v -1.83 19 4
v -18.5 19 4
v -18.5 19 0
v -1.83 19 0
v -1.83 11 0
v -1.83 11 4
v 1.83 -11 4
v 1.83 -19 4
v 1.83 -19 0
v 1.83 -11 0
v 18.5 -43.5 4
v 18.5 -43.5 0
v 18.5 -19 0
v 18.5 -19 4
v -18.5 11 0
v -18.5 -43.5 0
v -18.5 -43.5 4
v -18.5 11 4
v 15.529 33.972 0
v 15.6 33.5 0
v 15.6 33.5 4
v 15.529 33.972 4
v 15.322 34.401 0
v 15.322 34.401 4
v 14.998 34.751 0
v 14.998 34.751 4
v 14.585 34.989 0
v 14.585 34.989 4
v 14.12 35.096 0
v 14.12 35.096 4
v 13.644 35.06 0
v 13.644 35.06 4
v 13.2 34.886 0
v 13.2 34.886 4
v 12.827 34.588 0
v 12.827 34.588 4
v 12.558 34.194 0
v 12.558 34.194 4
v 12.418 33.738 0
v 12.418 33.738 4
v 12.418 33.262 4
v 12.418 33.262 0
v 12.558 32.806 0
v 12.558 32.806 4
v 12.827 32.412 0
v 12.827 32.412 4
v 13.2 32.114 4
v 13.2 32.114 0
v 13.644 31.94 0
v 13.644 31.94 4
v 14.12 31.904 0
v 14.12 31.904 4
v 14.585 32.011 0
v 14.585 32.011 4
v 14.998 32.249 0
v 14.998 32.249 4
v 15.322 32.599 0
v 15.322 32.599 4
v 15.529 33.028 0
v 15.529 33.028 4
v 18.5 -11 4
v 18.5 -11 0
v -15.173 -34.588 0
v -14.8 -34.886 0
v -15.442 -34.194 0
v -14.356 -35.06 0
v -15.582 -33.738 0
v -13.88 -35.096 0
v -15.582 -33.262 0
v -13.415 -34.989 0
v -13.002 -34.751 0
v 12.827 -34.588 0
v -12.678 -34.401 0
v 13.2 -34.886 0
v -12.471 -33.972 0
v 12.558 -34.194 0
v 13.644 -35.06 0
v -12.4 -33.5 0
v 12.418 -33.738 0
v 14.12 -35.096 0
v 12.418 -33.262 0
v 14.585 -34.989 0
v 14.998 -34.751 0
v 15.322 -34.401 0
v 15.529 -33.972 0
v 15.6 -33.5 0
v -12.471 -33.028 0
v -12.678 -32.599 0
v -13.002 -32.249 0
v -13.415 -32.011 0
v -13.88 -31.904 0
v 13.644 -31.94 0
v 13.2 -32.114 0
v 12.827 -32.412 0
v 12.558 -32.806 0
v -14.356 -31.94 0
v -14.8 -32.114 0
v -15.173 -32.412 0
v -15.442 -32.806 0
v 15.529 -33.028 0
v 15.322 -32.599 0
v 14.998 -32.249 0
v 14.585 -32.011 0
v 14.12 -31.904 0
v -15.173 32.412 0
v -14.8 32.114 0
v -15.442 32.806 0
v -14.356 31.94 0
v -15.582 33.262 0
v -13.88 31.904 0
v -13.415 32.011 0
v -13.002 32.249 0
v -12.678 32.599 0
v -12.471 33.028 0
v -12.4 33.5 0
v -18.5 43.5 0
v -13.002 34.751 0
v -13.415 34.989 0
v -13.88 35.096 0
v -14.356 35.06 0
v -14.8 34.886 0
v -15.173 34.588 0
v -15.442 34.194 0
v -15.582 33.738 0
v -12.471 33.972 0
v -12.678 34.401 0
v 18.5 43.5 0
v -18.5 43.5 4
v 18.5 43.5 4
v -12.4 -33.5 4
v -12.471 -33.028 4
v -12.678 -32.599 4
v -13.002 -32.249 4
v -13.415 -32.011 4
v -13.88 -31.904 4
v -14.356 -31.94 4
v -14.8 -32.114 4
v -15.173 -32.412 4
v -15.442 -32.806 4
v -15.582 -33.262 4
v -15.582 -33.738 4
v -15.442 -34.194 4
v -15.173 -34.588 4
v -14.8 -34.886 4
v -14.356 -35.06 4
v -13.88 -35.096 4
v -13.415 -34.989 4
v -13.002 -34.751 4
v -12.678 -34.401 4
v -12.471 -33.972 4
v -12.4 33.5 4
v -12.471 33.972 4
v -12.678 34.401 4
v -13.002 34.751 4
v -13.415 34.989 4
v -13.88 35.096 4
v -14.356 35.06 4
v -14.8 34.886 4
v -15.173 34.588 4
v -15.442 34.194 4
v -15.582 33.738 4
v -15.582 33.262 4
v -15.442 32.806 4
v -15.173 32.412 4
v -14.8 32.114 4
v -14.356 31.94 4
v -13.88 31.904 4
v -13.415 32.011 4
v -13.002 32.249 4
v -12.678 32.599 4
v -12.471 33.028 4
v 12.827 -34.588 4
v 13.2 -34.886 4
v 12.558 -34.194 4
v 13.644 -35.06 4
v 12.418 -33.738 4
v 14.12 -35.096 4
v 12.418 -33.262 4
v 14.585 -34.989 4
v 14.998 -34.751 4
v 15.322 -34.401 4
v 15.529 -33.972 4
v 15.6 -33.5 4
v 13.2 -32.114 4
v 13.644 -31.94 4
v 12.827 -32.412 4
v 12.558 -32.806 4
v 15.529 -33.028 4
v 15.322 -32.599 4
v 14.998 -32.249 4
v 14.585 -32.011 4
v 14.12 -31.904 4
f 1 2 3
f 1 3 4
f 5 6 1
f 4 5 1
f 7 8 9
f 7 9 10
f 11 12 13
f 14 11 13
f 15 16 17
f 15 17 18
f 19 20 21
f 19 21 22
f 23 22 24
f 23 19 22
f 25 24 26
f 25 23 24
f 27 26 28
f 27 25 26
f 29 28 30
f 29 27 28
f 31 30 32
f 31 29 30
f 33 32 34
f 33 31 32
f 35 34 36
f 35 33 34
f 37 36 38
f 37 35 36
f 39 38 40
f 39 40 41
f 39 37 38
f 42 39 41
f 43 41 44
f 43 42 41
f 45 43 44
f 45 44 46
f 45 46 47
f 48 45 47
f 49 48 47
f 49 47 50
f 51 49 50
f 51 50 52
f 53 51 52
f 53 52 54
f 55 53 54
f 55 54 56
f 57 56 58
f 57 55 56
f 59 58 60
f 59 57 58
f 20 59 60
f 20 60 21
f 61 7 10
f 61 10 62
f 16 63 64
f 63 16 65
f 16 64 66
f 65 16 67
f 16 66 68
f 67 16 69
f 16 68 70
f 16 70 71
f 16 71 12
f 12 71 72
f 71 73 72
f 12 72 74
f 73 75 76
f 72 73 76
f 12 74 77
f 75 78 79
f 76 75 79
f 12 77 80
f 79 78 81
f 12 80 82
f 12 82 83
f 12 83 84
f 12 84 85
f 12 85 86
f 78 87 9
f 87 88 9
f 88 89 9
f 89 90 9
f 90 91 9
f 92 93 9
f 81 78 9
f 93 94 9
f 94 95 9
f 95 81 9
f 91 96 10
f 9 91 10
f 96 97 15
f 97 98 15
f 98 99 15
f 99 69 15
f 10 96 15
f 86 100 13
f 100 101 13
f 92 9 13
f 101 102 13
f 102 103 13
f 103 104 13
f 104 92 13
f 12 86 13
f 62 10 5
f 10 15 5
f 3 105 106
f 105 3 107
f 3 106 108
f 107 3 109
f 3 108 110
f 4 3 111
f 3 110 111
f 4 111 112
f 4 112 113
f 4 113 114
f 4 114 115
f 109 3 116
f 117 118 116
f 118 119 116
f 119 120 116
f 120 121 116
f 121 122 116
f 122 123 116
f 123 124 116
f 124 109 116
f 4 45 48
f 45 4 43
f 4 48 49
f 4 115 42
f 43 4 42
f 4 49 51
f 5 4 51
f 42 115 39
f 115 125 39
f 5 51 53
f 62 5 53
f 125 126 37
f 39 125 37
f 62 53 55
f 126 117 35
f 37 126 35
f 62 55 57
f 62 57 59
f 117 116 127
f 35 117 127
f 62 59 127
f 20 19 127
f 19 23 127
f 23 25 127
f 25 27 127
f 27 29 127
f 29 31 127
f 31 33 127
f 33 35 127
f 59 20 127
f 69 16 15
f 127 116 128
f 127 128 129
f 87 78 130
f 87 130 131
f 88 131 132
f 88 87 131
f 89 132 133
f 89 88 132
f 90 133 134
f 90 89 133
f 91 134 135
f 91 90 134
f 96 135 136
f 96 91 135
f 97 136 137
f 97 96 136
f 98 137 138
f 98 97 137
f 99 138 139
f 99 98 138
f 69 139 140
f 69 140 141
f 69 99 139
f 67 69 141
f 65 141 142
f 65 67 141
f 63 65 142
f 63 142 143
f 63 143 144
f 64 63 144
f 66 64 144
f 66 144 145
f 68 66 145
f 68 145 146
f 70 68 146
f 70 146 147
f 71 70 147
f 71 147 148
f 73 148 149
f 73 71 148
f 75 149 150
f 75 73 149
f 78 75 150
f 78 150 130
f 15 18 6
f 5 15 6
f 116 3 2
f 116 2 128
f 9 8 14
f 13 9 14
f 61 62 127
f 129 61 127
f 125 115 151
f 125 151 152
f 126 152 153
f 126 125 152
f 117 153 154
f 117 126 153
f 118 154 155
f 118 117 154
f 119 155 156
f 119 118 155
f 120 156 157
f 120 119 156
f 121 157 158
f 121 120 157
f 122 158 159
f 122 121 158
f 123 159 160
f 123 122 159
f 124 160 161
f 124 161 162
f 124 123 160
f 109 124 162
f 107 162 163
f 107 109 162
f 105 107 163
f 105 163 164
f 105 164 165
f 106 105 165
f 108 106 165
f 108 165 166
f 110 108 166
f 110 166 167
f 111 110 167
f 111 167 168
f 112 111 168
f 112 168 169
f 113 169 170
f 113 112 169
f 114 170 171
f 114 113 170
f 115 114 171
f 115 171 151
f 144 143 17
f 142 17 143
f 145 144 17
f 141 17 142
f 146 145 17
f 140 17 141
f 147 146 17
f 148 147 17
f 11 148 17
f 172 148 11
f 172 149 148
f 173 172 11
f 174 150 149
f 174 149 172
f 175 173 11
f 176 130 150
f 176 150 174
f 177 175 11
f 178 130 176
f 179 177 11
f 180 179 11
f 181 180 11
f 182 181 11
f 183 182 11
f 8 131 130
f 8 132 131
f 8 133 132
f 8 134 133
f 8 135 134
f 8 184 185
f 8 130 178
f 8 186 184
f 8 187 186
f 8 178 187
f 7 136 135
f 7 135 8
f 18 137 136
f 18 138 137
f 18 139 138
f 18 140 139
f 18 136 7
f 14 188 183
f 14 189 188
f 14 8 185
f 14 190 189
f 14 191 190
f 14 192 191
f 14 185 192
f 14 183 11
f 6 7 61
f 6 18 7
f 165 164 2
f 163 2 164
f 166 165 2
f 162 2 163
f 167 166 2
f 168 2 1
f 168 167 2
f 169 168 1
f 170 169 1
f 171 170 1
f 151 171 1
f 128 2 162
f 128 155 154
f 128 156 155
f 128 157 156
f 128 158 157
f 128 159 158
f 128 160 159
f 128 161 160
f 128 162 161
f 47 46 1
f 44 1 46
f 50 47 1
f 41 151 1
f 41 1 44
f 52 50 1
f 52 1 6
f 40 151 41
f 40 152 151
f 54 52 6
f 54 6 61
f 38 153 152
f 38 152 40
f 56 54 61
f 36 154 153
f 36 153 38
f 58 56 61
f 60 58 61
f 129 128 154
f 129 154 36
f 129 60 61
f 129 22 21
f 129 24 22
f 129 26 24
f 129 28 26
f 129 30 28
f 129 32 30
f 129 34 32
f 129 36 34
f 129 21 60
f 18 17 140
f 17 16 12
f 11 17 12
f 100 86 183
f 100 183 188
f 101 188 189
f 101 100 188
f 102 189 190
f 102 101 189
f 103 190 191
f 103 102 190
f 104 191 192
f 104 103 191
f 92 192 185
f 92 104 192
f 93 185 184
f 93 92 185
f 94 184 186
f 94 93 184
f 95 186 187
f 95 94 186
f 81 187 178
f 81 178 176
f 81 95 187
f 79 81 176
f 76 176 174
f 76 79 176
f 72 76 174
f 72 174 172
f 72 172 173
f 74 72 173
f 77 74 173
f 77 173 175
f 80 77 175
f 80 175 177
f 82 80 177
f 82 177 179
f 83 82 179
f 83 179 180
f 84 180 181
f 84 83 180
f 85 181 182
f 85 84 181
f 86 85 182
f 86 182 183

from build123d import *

# Parameters (mm, degrees)
SKETCH_1_W          = 37
SKETCH_1_H          = 87
SKETCH_1_R          = 1.6
EXTRUDE_1_DEPTH     = 4
SKETCH_2_W          = 16.67
SKETCH_2_H          = 8
CUT_EXTRUDE_1_DEPTH = 48.439435073


with BuildPart() as part:
    # 草图1 → 凸台-拉伸1 (new body)
    with BuildSketch(Plane.XY):
        Rectangle(SKETCH_1_W, SKETCH_1_H)
        with Locations((-14, 33.5)):
            Circle(SKETCH_1_R, mode=Mode.SUBTRACT)
        with Locations((14, 33.5)):
            Circle(SKETCH_1_R, mode=Mode.SUBTRACT)
        with Locations((-14, -33.5)):
            Circle(SKETCH_1_R, mode=Mode.SUBTRACT)
        with Locations((14, -33.5)):
            Circle(SKETCH_1_R, mode=Mode.SUBTRACT)
    extrude(amount=EXTRUDE_1_DEPTH)

    # 草图2 → 切除-拉伸1 (cut, through all)
    with BuildSketch(Plane.XY.offset(4)):
        with Locations((-10.165, 15)):
            Rectangle(SKETCH_2_W, SKETCH_2_H)
        with Locations((10.165, -15)):
            Rectangle(SKETCH_2_W, SKETCH_2_H)
    extrude(amount=-CUT_EXTRUDE_1_DEPTH, mode=Mode.SUBTRACT)


solid = part.part
